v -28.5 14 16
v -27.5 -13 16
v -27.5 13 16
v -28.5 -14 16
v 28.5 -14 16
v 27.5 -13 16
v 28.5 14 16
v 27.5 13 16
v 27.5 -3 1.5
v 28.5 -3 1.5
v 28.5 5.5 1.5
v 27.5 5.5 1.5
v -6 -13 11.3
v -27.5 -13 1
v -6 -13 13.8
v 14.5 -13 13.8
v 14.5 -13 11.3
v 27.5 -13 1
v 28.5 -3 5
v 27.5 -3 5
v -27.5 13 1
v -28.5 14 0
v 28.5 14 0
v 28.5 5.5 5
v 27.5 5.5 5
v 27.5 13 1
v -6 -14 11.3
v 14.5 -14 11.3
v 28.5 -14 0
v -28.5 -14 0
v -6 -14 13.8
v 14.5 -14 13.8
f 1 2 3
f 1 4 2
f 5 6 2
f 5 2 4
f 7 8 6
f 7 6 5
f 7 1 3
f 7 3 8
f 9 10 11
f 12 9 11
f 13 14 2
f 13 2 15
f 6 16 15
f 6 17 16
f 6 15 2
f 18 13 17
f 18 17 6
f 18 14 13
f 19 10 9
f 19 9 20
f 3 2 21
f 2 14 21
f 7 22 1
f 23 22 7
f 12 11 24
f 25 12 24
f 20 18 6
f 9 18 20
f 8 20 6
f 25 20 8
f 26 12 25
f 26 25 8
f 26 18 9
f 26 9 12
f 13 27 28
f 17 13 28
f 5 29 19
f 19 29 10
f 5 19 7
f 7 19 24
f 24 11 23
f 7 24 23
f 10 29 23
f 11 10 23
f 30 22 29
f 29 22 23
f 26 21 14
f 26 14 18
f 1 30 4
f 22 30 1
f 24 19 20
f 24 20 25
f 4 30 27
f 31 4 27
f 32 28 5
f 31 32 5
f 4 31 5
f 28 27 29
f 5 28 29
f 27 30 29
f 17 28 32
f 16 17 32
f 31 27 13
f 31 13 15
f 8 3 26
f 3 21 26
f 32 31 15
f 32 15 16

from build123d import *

# Parameters (mm, degrees)
F0_W     = 57
F0_H     = 28
F1_DEPTH = 16
F2_T     = -1
F3_W     = 20.5
F3_H     = 2.5
F4_DEPTH = 3
F5_W     = 8.5
F5_H     = 3.5
F6_DEPTH = 3


with BuildPart() as f1:
    # F0 (on Top) → F1 (new body)
    with BuildSketch(Plane.XY):
        Rectangle(F0_W, F0_H)
    extrude(amount=F1_DEPTH)

    # F2
    f2_openings = [f1.faces().sort_by_distance(p)[0] for p in [
        (0, 0, 16),
    ]]
    offset(amount=F2_T, openings=f2_openings)

    # F3 (on face) → F4 (cut)
    with BuildSketch(Plane.XZ.offset(14)):
        with Locations((4.25, 12.55)):
            Rectangle(F3_W, F3_H)
    extrude(amount=-F4_DEPTH, mode=Mode.SUBTRACT)

    # F5 (on face) → F6 (cut)
    with BuildSketch(Plane.YZ.offset(28.5)):
        with Locations((1.25, 3.25)):
            Rectangle(F5_W, F5_H)
    extrude(amount=-F6_DEPTH, mode=Mode.SUBTRACT)


solid = f1.part
